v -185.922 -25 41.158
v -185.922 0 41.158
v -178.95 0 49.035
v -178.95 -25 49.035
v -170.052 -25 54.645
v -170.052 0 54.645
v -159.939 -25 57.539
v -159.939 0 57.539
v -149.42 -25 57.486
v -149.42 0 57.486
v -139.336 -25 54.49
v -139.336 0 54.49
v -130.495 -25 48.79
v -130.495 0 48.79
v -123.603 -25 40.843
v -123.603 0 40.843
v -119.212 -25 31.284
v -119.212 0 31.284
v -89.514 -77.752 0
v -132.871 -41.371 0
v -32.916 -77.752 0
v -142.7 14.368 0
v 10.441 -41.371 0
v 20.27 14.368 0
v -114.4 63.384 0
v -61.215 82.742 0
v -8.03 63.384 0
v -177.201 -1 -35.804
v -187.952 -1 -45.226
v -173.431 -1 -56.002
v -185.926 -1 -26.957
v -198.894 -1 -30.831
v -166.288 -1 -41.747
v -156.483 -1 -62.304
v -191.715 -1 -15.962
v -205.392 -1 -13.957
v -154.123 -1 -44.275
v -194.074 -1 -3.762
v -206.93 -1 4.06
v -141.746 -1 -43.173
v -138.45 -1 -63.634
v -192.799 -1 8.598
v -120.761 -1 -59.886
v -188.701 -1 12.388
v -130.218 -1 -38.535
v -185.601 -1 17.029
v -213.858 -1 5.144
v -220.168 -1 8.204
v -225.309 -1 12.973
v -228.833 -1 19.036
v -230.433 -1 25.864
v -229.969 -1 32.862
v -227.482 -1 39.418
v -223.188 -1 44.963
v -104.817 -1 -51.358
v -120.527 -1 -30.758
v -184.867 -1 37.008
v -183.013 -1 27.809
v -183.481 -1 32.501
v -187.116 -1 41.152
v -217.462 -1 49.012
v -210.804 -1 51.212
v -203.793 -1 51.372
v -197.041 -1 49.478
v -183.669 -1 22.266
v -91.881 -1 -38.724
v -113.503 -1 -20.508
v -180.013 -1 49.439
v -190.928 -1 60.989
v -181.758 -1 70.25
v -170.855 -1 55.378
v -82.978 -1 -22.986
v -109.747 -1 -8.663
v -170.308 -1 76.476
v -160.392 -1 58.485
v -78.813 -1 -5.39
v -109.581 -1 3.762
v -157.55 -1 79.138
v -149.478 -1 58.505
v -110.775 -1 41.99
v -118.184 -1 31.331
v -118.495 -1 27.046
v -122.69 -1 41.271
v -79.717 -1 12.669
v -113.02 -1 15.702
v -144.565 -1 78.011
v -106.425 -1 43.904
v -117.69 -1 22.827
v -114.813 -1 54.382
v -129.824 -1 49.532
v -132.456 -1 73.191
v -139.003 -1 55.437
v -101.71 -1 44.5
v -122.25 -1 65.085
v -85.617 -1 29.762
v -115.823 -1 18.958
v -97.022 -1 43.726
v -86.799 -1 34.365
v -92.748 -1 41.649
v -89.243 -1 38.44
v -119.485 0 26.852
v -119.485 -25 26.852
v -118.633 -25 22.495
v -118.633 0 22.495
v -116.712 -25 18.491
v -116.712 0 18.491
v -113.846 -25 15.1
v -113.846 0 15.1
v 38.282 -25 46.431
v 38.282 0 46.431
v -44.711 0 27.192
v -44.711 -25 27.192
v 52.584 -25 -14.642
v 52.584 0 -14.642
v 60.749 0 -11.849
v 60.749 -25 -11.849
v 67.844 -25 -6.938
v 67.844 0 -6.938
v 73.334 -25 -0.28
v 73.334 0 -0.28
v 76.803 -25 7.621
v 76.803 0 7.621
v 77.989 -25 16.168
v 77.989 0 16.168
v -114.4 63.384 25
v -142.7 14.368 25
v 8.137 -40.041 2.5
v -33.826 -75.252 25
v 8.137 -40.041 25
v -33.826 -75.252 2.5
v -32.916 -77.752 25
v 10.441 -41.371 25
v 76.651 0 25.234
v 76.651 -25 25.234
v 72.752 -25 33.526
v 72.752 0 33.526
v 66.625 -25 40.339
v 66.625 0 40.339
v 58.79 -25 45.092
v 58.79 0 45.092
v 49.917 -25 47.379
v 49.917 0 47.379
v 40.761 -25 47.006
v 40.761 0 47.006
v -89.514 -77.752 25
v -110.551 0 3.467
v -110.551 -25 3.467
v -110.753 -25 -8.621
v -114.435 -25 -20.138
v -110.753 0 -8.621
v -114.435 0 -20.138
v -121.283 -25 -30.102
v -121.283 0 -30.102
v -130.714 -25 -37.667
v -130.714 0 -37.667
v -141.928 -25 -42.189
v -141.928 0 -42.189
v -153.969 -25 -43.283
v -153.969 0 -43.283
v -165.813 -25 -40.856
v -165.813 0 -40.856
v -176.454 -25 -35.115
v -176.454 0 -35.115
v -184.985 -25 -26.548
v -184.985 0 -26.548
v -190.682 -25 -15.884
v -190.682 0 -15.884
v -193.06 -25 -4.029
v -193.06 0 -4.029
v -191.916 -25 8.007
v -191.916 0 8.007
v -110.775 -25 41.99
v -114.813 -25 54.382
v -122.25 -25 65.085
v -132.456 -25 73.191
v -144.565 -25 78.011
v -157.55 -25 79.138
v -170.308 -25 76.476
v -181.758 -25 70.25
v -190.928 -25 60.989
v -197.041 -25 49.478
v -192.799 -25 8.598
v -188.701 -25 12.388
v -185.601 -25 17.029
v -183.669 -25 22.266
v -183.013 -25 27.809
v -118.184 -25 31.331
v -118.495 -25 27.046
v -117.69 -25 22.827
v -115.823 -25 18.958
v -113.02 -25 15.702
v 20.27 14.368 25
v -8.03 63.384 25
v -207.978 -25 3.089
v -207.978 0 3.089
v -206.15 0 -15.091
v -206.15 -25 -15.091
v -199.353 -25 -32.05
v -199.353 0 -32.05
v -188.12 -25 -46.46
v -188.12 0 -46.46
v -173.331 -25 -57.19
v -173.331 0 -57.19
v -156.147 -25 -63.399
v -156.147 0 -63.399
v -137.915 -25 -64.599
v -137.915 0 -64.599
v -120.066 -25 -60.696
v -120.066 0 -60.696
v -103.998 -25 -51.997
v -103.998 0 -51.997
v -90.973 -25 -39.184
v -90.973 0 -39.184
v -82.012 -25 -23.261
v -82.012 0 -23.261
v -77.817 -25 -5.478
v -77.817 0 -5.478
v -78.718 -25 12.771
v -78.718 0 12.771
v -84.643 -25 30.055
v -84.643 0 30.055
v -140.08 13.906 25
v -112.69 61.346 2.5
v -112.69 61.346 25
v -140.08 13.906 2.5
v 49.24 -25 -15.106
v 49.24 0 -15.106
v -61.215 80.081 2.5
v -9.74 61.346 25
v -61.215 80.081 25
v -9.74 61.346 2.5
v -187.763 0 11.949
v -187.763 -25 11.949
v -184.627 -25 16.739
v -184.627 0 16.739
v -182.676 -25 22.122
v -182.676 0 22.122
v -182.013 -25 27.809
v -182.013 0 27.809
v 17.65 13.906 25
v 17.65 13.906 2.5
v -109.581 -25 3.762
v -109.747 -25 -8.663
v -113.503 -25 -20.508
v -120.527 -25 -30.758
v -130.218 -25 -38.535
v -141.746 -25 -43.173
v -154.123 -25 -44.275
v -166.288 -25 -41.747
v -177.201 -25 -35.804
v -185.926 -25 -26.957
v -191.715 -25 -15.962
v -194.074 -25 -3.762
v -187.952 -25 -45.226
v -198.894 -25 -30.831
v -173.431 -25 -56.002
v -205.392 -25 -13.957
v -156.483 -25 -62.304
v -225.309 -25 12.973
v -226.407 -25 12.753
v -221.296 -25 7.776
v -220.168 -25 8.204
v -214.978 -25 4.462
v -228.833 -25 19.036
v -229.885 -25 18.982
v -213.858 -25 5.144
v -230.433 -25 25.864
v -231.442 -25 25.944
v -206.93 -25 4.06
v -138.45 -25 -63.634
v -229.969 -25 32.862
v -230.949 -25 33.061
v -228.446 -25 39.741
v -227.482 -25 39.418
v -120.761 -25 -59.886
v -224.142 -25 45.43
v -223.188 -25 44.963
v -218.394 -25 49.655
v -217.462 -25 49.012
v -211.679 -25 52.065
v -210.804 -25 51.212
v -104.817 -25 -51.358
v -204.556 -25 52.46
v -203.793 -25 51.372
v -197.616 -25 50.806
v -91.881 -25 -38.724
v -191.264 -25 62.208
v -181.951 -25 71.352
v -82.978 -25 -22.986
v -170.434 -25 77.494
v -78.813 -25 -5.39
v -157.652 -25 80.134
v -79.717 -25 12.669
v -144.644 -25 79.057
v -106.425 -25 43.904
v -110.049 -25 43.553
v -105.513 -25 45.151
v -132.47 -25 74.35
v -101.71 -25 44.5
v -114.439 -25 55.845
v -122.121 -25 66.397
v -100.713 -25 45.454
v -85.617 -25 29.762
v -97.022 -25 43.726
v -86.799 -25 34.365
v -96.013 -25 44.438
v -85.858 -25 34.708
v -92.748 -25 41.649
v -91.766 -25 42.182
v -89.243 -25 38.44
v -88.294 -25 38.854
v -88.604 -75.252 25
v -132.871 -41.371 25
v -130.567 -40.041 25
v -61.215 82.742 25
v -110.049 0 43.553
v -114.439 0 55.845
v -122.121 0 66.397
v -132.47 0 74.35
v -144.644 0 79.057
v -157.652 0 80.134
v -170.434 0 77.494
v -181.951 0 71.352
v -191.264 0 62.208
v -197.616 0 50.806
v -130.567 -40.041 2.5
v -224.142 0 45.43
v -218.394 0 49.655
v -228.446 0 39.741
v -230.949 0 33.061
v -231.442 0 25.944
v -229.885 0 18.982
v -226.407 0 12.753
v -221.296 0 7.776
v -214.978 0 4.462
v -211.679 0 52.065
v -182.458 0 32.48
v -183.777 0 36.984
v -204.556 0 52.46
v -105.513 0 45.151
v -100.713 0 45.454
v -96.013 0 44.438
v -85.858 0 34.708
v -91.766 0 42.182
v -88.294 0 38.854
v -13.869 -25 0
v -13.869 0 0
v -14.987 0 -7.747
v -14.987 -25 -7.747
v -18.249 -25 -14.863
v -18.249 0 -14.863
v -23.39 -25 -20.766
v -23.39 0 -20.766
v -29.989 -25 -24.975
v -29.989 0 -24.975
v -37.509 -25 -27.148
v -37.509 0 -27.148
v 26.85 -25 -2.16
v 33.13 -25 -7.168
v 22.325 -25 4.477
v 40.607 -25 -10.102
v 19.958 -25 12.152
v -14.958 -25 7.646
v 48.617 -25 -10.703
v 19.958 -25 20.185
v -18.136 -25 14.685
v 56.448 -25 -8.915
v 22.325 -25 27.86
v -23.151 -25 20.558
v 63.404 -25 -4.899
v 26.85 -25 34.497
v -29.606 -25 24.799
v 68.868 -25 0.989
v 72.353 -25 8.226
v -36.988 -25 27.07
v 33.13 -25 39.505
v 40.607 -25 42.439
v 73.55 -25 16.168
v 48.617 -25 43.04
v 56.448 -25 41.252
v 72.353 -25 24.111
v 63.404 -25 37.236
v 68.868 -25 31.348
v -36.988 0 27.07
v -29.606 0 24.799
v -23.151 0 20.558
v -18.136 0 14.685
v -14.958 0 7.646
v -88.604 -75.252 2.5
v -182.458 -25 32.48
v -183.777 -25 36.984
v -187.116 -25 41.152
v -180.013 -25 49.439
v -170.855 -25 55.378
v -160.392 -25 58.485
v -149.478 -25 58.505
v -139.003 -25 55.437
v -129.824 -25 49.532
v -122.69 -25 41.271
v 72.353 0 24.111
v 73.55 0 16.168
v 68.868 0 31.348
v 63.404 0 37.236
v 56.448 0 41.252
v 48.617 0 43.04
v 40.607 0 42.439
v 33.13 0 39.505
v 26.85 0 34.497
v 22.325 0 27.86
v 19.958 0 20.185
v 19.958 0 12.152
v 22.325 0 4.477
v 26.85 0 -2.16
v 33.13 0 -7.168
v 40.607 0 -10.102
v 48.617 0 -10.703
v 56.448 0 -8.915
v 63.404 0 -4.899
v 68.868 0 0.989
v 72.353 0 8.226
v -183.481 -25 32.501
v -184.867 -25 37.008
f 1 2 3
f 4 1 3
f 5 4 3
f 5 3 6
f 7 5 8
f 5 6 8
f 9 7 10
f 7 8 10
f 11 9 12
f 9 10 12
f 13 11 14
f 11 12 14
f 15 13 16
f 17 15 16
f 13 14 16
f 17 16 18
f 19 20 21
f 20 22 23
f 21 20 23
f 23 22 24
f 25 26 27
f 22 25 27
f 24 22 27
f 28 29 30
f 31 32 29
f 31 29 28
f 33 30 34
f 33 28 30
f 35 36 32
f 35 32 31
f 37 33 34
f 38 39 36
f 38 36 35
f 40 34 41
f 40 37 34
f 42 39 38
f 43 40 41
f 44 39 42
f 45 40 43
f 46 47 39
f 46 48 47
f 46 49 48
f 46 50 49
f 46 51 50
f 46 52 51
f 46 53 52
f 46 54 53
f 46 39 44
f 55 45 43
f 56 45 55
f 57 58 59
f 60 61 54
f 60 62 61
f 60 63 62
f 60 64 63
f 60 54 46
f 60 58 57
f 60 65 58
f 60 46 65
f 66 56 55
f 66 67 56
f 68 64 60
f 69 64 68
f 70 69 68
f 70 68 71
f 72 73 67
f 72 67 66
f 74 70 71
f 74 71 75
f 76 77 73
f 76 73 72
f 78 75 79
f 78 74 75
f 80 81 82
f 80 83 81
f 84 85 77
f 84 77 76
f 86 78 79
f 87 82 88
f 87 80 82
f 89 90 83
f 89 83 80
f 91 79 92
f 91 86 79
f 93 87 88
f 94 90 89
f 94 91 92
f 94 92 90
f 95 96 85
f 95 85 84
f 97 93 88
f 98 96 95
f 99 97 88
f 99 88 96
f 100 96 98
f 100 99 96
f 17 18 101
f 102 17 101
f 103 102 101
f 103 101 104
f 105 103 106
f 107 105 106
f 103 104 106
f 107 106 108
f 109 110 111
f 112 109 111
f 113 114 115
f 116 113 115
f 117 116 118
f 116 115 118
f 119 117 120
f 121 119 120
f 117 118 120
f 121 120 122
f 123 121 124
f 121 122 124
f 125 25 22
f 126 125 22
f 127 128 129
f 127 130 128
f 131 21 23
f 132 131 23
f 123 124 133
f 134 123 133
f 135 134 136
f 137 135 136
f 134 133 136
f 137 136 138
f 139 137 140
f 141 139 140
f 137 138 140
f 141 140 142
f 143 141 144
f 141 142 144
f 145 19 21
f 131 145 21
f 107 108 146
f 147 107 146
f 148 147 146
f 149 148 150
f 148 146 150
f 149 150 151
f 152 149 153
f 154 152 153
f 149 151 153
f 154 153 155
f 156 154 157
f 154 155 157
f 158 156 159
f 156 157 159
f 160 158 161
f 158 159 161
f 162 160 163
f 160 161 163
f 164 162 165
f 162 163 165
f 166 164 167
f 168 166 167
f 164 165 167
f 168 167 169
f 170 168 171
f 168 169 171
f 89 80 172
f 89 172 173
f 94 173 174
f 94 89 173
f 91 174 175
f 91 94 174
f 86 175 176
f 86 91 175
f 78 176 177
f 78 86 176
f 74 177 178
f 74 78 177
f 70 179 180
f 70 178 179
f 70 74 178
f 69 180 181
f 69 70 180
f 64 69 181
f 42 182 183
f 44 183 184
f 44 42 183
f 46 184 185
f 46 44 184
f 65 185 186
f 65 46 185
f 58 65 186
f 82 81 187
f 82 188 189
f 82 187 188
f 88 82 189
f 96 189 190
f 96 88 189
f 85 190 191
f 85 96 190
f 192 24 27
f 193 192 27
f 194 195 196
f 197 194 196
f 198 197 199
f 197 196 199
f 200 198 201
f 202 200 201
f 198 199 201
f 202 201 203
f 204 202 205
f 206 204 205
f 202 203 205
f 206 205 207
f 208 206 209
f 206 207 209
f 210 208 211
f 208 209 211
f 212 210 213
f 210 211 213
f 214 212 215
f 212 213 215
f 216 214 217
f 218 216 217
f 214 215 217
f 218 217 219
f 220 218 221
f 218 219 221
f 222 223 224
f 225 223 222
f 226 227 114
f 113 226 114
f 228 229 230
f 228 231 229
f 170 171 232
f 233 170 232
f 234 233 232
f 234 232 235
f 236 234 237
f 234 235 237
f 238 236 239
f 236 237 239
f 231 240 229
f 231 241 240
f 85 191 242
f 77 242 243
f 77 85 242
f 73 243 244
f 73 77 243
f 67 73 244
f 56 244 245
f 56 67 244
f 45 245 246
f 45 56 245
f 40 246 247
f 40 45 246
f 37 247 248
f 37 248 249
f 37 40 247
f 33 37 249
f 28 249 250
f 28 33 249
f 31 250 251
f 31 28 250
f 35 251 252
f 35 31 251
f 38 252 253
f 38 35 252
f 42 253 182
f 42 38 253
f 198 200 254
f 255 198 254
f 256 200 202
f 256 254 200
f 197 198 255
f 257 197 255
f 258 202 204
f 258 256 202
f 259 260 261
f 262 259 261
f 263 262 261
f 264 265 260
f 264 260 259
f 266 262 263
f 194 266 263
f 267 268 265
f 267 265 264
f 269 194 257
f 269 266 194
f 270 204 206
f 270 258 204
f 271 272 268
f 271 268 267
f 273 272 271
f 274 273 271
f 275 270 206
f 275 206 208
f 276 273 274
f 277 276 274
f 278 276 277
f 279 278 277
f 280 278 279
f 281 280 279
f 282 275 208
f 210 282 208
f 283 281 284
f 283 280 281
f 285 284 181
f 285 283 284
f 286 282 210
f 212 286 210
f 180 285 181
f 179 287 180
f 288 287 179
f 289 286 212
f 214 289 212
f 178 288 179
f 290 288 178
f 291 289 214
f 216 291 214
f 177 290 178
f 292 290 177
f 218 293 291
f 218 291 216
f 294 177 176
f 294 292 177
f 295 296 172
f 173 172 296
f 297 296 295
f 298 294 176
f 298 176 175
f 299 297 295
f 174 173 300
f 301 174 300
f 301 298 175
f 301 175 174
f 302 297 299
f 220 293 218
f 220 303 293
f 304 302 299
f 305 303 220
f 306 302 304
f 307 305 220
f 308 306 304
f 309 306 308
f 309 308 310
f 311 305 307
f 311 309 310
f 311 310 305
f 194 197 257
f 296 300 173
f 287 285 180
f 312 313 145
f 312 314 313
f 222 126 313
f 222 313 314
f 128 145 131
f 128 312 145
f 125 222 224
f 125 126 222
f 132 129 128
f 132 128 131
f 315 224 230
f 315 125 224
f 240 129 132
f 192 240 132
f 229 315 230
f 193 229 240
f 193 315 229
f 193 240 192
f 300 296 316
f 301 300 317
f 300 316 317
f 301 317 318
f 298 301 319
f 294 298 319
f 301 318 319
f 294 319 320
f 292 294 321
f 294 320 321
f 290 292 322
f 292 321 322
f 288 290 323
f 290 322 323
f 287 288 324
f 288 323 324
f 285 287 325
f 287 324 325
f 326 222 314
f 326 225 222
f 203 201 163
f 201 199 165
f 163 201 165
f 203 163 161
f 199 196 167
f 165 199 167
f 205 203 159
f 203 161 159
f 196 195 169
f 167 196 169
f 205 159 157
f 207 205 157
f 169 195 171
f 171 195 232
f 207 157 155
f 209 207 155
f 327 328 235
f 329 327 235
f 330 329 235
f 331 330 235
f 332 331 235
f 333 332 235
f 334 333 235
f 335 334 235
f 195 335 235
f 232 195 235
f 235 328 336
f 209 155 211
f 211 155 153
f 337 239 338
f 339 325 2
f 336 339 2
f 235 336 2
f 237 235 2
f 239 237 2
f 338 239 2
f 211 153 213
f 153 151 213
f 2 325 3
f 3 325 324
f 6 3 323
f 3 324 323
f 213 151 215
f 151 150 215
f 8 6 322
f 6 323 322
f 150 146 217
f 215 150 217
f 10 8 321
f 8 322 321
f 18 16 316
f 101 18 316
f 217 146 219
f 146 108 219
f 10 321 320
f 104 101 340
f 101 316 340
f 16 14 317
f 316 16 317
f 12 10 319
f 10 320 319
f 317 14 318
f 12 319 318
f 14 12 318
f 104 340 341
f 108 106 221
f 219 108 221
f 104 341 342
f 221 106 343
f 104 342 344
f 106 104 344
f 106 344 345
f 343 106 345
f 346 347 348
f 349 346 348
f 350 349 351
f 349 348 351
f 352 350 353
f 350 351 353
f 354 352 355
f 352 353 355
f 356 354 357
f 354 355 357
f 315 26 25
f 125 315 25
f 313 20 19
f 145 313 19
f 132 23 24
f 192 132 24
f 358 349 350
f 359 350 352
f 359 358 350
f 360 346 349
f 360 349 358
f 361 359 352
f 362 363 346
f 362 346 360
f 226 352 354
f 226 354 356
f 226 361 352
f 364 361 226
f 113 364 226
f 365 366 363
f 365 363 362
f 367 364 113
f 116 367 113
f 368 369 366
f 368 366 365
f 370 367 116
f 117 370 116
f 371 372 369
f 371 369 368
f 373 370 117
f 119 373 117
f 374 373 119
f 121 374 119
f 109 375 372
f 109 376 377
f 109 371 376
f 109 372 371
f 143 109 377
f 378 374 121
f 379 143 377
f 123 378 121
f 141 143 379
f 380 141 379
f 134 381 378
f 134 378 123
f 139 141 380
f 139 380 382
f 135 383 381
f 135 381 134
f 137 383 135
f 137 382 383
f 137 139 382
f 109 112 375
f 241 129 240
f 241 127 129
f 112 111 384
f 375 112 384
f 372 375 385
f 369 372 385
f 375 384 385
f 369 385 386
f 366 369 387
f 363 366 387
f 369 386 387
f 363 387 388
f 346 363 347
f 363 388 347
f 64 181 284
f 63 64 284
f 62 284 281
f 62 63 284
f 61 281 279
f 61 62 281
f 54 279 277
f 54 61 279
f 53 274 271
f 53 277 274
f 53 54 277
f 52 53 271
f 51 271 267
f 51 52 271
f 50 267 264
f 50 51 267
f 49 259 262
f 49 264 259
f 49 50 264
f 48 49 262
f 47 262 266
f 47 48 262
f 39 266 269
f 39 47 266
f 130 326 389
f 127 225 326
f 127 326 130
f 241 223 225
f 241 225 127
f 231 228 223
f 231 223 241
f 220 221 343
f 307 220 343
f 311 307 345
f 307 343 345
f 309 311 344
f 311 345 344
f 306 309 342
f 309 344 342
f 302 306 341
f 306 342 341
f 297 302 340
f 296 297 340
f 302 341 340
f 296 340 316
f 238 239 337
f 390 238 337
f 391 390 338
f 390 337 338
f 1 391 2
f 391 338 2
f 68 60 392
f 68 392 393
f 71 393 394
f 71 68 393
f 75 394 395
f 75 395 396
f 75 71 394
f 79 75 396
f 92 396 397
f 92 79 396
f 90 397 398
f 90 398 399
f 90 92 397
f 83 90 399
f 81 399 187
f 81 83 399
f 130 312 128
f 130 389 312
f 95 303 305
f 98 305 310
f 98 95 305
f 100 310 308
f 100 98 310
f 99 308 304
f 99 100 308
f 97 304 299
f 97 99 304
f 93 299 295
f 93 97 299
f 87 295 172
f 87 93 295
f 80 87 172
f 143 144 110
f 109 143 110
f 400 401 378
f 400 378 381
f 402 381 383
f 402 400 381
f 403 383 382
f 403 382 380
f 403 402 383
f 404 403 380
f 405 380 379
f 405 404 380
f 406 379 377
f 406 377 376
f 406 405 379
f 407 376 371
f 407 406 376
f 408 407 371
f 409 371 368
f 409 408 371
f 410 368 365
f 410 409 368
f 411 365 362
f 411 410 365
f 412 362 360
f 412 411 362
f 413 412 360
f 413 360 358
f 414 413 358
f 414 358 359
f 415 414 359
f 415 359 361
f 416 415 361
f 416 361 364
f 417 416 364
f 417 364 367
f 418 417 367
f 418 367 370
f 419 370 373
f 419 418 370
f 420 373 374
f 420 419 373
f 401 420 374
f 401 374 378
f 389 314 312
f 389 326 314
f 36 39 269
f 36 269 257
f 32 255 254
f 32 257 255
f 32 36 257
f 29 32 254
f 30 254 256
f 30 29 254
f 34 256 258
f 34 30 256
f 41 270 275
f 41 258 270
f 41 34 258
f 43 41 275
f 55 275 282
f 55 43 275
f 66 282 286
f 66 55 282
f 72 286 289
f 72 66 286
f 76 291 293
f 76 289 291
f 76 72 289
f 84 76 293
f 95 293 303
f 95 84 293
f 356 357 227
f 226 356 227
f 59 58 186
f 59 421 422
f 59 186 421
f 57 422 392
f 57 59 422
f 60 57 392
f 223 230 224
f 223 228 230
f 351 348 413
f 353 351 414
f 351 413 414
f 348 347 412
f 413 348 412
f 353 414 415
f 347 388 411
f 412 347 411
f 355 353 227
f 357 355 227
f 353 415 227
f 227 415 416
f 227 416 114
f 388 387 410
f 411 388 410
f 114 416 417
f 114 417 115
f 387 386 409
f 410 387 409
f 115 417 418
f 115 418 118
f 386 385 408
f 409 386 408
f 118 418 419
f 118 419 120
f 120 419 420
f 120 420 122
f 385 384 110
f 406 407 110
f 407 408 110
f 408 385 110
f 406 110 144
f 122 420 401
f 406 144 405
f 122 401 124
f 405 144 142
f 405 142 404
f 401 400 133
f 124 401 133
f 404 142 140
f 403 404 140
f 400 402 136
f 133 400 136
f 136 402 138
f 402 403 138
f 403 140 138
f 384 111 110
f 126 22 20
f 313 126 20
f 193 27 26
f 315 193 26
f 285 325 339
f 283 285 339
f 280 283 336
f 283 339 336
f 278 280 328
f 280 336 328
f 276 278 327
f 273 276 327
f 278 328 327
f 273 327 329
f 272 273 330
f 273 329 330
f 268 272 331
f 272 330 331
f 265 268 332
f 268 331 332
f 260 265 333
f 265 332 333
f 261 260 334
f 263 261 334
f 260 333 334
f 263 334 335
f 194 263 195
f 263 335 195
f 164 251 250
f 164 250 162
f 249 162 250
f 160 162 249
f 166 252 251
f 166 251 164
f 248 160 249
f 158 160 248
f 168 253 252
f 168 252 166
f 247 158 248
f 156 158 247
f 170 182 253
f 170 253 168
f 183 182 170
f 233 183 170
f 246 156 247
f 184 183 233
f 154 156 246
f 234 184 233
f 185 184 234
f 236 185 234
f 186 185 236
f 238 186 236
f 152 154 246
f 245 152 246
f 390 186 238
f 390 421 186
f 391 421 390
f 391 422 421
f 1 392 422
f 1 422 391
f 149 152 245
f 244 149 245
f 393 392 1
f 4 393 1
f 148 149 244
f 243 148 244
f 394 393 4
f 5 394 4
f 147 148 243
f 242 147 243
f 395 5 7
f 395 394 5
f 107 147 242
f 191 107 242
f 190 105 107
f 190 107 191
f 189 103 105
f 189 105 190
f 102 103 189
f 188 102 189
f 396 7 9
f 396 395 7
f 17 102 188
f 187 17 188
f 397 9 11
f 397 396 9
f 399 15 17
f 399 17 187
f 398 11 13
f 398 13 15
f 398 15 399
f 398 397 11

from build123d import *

# Parameters (mm, degrees)
F0_R     = 26.9464960859
F1_DEPTH = 25
F3_DEPTH = 25
F4_T     = -1
F6_DEPTH = 25
F7_T     = -2.5


# Not quite as in the source:
# - a feature of the source that left no trace in its solid (it failed there, or was rolled back) is left out
# - the program builds the solid bodies; features that only make, move or delete a surface that nothing else refers to are left out


with BuildPart() as f1:
    # F0 (on Front) → F1 (new body)
    with BuildSketch(Plane.XZ):
        with BuildLine():
            Line((40.761068845, 47.0056567036), (38.2815639413, 46.4308663652))
            ThreePointArc((38.2815639413, 46.4308663652), (15.703663518, 10.6659749386), (49.2399074327, -15.1062851558))
            Line((49.2399074327, -15.1062851558), (52.5844195802, -14.6420472673))
            ThreePointArc((52.5844195802, -14.6420472673), (70.8188113885, -3.7982421999), (77.988971946, 16.1684788764))
            ThreePointArc((77.988971946, 16.1684788764), (66.6245182731, 40.3389583174), (40.761068845, 47.0056567036))
        make_face()
        with Locations((46.6032624245, 16.1684788764)):
            Circle(F0_R, mode=Mode.SUBTRACT)
        with BuildLine():
            ThreePointArc((-44.7106001415, 27.1919070038), (-23.151428053, 20.5583413445), (-13.8693649386, 0))
            ThreePointArc((-13.8693649386, 0), (-20.6075462255, -17.9987370156), (-37.5089408348, -27.1475337383))
            Line((-37.5089408348, -27.1475337383), (49.2399074327, -15.1062851558))
            ThreePointArc((49.2399074327, -15.1062851558), (15.703663518, 10.6659749386), (38.2815639413, 46.4308663652))
            Line((38.2815639413, 46.4308663652), (-44.7106001415, 27.1919070038))
        make_face()
    extrude(amount=F1_DEPTH)


with BuildPart() as f3:
    # F2 (on Front) → F3 (new body)
    with BuildSketch(Plane.XZ):
        with BuildLine():
            ThreePointArc((-197.6164360222, 50.8064648047), (-230.9491852504, 33.0606563326), (-207.9779482368, 3.0888669381))
            ThreePointArc((-207.9779482368, 3.0888669381), (-199.5168720301, 4.1435435485), (-191.9158228131, 8.0069881422))
            ThreePointArc((-191.9158228131, 8.0069881422), (-184.626891673, 16.7388855513), (-182.0132419339, 27.8088171035))
            ThreePointArc((-182.0132419339, 27.8088171035), (-183.0104691396, 34.7635176788), (-185.921789492, 41.1577757279))
            ThreePointArc((-185.921789492, 41.1577757279), (-191.012098095, 46.8996561949), (-197.6164360222, 50.8064648047))
        make_face()
        with BuildLine():
            ThreePointArc((-119.2122107169, 31.2843508649), (-116.0438313369, 38.4743002747), (-110.0490633826, 43.5533511295))
            ThreePointArc((-110.0490633826, 43.5533511295), (-151.1091973781, 80.0615546597), (-197.6164360222, 50.8064648047))
            ThreePointArc((-197.6164360222, 50.8064648047), (-191.012098095, 46.8996561949), (-185.921789492, 41.1577757279))
            ThreePointArc((-185.921789492, 41.1577757279), (-149.4196390648, 57.4861392064), (-119.2122107169, 31.2843508649))
        make_face()
        with BuildLine():
            ThreePointArc((-113.8456945473, 15.100368808), (-94.9747299387, 11.984555216), (-84.5226842358, 28.0025557225))
            ThreePointArc((-84.5226842358, 28.0025557225), (-84.552889755, 29.030310945), (-84.6434020412, 30.0545182956))
            ThreePointArc((-84.6434020412, 30.0545182956), (-93.811483299, 43.4565577664), (-110.0490633826, 43.5533511295))
            ThreePointArc((-110.0490633826, 43.5533511295), (-116.0438313369, 38.4743002747), (-119.2122107169, 31.2843508649))
            ThreePointArc((-119.2122107169, 31.2843508649), (-118.6332875237, 22.4945743852), (-113.8456945473, 15.100368808))
        make_face()
        with BuildLine():
            ThreePointArc((-84.6434020412, 30.0545182956), (-84.552889755, 29.030310945), (-84.5226842358, 28.0025557225))
            ThreePointArc((-84.5226842358, 28.0025557225), (-94.9747299387, 11.984555216), (-113.8456945473, 15.100368808))
            ThreePointArc((-113.8456945473, 15.100368808), (-147.9079885613, -43.1768963111), (-191.9158228131, 8.0069881422))
            ThreePointArc((-191.9158228131, 8.0069881422), (-199.5168720301, 4.1435435485), (-207.9779482368, 3.0888669381))
            ThreePointArc((-207.9779482368, 3.0888669381), (-128.8530958523, -63.275168505), (-84.6434020412, 30.0545182956))
        make_face()
    extrude(amount=F3_DEPTH)

    # F4
    f4_openings = [f3.faces().sort_by_distance(p)[0] for p in [
        (-228.882394, -25, 32.611868),
    ]]
    offset(amount=F4_T, openings=f4_openings, kind=Kind.INTERSECTION)


with BuildPart() as f6:
    # F5 (on Top) → F6 (new body)
    with BuildSketch(Plane.XY):
        Polygon((-89.5143109171, -77.751763165), (-32.9156560095, -77.751763165), (10.4414290704, -41.3708490655), (20.2696823535, 14.3679450975), (-8.0296451003, 63.3838180675), (-61.2149834633, 82.741698131), (-114.4003218263, 63.3838180675), (-142.6996492801, 14.3679450975), (-132.871395997, -41.3708490655), align=None)
    extrude(amount=F6_DEPTH)

    # F7
    f7_openings = [f6.faces().sort_by_distance(p)[0] for p in [
        (-61.214983, 0, 25),
    ]]
    offset(amount=F7_T, openings=f7_openings)


solid = Compound([f1.part, f3.part, f6.part])
